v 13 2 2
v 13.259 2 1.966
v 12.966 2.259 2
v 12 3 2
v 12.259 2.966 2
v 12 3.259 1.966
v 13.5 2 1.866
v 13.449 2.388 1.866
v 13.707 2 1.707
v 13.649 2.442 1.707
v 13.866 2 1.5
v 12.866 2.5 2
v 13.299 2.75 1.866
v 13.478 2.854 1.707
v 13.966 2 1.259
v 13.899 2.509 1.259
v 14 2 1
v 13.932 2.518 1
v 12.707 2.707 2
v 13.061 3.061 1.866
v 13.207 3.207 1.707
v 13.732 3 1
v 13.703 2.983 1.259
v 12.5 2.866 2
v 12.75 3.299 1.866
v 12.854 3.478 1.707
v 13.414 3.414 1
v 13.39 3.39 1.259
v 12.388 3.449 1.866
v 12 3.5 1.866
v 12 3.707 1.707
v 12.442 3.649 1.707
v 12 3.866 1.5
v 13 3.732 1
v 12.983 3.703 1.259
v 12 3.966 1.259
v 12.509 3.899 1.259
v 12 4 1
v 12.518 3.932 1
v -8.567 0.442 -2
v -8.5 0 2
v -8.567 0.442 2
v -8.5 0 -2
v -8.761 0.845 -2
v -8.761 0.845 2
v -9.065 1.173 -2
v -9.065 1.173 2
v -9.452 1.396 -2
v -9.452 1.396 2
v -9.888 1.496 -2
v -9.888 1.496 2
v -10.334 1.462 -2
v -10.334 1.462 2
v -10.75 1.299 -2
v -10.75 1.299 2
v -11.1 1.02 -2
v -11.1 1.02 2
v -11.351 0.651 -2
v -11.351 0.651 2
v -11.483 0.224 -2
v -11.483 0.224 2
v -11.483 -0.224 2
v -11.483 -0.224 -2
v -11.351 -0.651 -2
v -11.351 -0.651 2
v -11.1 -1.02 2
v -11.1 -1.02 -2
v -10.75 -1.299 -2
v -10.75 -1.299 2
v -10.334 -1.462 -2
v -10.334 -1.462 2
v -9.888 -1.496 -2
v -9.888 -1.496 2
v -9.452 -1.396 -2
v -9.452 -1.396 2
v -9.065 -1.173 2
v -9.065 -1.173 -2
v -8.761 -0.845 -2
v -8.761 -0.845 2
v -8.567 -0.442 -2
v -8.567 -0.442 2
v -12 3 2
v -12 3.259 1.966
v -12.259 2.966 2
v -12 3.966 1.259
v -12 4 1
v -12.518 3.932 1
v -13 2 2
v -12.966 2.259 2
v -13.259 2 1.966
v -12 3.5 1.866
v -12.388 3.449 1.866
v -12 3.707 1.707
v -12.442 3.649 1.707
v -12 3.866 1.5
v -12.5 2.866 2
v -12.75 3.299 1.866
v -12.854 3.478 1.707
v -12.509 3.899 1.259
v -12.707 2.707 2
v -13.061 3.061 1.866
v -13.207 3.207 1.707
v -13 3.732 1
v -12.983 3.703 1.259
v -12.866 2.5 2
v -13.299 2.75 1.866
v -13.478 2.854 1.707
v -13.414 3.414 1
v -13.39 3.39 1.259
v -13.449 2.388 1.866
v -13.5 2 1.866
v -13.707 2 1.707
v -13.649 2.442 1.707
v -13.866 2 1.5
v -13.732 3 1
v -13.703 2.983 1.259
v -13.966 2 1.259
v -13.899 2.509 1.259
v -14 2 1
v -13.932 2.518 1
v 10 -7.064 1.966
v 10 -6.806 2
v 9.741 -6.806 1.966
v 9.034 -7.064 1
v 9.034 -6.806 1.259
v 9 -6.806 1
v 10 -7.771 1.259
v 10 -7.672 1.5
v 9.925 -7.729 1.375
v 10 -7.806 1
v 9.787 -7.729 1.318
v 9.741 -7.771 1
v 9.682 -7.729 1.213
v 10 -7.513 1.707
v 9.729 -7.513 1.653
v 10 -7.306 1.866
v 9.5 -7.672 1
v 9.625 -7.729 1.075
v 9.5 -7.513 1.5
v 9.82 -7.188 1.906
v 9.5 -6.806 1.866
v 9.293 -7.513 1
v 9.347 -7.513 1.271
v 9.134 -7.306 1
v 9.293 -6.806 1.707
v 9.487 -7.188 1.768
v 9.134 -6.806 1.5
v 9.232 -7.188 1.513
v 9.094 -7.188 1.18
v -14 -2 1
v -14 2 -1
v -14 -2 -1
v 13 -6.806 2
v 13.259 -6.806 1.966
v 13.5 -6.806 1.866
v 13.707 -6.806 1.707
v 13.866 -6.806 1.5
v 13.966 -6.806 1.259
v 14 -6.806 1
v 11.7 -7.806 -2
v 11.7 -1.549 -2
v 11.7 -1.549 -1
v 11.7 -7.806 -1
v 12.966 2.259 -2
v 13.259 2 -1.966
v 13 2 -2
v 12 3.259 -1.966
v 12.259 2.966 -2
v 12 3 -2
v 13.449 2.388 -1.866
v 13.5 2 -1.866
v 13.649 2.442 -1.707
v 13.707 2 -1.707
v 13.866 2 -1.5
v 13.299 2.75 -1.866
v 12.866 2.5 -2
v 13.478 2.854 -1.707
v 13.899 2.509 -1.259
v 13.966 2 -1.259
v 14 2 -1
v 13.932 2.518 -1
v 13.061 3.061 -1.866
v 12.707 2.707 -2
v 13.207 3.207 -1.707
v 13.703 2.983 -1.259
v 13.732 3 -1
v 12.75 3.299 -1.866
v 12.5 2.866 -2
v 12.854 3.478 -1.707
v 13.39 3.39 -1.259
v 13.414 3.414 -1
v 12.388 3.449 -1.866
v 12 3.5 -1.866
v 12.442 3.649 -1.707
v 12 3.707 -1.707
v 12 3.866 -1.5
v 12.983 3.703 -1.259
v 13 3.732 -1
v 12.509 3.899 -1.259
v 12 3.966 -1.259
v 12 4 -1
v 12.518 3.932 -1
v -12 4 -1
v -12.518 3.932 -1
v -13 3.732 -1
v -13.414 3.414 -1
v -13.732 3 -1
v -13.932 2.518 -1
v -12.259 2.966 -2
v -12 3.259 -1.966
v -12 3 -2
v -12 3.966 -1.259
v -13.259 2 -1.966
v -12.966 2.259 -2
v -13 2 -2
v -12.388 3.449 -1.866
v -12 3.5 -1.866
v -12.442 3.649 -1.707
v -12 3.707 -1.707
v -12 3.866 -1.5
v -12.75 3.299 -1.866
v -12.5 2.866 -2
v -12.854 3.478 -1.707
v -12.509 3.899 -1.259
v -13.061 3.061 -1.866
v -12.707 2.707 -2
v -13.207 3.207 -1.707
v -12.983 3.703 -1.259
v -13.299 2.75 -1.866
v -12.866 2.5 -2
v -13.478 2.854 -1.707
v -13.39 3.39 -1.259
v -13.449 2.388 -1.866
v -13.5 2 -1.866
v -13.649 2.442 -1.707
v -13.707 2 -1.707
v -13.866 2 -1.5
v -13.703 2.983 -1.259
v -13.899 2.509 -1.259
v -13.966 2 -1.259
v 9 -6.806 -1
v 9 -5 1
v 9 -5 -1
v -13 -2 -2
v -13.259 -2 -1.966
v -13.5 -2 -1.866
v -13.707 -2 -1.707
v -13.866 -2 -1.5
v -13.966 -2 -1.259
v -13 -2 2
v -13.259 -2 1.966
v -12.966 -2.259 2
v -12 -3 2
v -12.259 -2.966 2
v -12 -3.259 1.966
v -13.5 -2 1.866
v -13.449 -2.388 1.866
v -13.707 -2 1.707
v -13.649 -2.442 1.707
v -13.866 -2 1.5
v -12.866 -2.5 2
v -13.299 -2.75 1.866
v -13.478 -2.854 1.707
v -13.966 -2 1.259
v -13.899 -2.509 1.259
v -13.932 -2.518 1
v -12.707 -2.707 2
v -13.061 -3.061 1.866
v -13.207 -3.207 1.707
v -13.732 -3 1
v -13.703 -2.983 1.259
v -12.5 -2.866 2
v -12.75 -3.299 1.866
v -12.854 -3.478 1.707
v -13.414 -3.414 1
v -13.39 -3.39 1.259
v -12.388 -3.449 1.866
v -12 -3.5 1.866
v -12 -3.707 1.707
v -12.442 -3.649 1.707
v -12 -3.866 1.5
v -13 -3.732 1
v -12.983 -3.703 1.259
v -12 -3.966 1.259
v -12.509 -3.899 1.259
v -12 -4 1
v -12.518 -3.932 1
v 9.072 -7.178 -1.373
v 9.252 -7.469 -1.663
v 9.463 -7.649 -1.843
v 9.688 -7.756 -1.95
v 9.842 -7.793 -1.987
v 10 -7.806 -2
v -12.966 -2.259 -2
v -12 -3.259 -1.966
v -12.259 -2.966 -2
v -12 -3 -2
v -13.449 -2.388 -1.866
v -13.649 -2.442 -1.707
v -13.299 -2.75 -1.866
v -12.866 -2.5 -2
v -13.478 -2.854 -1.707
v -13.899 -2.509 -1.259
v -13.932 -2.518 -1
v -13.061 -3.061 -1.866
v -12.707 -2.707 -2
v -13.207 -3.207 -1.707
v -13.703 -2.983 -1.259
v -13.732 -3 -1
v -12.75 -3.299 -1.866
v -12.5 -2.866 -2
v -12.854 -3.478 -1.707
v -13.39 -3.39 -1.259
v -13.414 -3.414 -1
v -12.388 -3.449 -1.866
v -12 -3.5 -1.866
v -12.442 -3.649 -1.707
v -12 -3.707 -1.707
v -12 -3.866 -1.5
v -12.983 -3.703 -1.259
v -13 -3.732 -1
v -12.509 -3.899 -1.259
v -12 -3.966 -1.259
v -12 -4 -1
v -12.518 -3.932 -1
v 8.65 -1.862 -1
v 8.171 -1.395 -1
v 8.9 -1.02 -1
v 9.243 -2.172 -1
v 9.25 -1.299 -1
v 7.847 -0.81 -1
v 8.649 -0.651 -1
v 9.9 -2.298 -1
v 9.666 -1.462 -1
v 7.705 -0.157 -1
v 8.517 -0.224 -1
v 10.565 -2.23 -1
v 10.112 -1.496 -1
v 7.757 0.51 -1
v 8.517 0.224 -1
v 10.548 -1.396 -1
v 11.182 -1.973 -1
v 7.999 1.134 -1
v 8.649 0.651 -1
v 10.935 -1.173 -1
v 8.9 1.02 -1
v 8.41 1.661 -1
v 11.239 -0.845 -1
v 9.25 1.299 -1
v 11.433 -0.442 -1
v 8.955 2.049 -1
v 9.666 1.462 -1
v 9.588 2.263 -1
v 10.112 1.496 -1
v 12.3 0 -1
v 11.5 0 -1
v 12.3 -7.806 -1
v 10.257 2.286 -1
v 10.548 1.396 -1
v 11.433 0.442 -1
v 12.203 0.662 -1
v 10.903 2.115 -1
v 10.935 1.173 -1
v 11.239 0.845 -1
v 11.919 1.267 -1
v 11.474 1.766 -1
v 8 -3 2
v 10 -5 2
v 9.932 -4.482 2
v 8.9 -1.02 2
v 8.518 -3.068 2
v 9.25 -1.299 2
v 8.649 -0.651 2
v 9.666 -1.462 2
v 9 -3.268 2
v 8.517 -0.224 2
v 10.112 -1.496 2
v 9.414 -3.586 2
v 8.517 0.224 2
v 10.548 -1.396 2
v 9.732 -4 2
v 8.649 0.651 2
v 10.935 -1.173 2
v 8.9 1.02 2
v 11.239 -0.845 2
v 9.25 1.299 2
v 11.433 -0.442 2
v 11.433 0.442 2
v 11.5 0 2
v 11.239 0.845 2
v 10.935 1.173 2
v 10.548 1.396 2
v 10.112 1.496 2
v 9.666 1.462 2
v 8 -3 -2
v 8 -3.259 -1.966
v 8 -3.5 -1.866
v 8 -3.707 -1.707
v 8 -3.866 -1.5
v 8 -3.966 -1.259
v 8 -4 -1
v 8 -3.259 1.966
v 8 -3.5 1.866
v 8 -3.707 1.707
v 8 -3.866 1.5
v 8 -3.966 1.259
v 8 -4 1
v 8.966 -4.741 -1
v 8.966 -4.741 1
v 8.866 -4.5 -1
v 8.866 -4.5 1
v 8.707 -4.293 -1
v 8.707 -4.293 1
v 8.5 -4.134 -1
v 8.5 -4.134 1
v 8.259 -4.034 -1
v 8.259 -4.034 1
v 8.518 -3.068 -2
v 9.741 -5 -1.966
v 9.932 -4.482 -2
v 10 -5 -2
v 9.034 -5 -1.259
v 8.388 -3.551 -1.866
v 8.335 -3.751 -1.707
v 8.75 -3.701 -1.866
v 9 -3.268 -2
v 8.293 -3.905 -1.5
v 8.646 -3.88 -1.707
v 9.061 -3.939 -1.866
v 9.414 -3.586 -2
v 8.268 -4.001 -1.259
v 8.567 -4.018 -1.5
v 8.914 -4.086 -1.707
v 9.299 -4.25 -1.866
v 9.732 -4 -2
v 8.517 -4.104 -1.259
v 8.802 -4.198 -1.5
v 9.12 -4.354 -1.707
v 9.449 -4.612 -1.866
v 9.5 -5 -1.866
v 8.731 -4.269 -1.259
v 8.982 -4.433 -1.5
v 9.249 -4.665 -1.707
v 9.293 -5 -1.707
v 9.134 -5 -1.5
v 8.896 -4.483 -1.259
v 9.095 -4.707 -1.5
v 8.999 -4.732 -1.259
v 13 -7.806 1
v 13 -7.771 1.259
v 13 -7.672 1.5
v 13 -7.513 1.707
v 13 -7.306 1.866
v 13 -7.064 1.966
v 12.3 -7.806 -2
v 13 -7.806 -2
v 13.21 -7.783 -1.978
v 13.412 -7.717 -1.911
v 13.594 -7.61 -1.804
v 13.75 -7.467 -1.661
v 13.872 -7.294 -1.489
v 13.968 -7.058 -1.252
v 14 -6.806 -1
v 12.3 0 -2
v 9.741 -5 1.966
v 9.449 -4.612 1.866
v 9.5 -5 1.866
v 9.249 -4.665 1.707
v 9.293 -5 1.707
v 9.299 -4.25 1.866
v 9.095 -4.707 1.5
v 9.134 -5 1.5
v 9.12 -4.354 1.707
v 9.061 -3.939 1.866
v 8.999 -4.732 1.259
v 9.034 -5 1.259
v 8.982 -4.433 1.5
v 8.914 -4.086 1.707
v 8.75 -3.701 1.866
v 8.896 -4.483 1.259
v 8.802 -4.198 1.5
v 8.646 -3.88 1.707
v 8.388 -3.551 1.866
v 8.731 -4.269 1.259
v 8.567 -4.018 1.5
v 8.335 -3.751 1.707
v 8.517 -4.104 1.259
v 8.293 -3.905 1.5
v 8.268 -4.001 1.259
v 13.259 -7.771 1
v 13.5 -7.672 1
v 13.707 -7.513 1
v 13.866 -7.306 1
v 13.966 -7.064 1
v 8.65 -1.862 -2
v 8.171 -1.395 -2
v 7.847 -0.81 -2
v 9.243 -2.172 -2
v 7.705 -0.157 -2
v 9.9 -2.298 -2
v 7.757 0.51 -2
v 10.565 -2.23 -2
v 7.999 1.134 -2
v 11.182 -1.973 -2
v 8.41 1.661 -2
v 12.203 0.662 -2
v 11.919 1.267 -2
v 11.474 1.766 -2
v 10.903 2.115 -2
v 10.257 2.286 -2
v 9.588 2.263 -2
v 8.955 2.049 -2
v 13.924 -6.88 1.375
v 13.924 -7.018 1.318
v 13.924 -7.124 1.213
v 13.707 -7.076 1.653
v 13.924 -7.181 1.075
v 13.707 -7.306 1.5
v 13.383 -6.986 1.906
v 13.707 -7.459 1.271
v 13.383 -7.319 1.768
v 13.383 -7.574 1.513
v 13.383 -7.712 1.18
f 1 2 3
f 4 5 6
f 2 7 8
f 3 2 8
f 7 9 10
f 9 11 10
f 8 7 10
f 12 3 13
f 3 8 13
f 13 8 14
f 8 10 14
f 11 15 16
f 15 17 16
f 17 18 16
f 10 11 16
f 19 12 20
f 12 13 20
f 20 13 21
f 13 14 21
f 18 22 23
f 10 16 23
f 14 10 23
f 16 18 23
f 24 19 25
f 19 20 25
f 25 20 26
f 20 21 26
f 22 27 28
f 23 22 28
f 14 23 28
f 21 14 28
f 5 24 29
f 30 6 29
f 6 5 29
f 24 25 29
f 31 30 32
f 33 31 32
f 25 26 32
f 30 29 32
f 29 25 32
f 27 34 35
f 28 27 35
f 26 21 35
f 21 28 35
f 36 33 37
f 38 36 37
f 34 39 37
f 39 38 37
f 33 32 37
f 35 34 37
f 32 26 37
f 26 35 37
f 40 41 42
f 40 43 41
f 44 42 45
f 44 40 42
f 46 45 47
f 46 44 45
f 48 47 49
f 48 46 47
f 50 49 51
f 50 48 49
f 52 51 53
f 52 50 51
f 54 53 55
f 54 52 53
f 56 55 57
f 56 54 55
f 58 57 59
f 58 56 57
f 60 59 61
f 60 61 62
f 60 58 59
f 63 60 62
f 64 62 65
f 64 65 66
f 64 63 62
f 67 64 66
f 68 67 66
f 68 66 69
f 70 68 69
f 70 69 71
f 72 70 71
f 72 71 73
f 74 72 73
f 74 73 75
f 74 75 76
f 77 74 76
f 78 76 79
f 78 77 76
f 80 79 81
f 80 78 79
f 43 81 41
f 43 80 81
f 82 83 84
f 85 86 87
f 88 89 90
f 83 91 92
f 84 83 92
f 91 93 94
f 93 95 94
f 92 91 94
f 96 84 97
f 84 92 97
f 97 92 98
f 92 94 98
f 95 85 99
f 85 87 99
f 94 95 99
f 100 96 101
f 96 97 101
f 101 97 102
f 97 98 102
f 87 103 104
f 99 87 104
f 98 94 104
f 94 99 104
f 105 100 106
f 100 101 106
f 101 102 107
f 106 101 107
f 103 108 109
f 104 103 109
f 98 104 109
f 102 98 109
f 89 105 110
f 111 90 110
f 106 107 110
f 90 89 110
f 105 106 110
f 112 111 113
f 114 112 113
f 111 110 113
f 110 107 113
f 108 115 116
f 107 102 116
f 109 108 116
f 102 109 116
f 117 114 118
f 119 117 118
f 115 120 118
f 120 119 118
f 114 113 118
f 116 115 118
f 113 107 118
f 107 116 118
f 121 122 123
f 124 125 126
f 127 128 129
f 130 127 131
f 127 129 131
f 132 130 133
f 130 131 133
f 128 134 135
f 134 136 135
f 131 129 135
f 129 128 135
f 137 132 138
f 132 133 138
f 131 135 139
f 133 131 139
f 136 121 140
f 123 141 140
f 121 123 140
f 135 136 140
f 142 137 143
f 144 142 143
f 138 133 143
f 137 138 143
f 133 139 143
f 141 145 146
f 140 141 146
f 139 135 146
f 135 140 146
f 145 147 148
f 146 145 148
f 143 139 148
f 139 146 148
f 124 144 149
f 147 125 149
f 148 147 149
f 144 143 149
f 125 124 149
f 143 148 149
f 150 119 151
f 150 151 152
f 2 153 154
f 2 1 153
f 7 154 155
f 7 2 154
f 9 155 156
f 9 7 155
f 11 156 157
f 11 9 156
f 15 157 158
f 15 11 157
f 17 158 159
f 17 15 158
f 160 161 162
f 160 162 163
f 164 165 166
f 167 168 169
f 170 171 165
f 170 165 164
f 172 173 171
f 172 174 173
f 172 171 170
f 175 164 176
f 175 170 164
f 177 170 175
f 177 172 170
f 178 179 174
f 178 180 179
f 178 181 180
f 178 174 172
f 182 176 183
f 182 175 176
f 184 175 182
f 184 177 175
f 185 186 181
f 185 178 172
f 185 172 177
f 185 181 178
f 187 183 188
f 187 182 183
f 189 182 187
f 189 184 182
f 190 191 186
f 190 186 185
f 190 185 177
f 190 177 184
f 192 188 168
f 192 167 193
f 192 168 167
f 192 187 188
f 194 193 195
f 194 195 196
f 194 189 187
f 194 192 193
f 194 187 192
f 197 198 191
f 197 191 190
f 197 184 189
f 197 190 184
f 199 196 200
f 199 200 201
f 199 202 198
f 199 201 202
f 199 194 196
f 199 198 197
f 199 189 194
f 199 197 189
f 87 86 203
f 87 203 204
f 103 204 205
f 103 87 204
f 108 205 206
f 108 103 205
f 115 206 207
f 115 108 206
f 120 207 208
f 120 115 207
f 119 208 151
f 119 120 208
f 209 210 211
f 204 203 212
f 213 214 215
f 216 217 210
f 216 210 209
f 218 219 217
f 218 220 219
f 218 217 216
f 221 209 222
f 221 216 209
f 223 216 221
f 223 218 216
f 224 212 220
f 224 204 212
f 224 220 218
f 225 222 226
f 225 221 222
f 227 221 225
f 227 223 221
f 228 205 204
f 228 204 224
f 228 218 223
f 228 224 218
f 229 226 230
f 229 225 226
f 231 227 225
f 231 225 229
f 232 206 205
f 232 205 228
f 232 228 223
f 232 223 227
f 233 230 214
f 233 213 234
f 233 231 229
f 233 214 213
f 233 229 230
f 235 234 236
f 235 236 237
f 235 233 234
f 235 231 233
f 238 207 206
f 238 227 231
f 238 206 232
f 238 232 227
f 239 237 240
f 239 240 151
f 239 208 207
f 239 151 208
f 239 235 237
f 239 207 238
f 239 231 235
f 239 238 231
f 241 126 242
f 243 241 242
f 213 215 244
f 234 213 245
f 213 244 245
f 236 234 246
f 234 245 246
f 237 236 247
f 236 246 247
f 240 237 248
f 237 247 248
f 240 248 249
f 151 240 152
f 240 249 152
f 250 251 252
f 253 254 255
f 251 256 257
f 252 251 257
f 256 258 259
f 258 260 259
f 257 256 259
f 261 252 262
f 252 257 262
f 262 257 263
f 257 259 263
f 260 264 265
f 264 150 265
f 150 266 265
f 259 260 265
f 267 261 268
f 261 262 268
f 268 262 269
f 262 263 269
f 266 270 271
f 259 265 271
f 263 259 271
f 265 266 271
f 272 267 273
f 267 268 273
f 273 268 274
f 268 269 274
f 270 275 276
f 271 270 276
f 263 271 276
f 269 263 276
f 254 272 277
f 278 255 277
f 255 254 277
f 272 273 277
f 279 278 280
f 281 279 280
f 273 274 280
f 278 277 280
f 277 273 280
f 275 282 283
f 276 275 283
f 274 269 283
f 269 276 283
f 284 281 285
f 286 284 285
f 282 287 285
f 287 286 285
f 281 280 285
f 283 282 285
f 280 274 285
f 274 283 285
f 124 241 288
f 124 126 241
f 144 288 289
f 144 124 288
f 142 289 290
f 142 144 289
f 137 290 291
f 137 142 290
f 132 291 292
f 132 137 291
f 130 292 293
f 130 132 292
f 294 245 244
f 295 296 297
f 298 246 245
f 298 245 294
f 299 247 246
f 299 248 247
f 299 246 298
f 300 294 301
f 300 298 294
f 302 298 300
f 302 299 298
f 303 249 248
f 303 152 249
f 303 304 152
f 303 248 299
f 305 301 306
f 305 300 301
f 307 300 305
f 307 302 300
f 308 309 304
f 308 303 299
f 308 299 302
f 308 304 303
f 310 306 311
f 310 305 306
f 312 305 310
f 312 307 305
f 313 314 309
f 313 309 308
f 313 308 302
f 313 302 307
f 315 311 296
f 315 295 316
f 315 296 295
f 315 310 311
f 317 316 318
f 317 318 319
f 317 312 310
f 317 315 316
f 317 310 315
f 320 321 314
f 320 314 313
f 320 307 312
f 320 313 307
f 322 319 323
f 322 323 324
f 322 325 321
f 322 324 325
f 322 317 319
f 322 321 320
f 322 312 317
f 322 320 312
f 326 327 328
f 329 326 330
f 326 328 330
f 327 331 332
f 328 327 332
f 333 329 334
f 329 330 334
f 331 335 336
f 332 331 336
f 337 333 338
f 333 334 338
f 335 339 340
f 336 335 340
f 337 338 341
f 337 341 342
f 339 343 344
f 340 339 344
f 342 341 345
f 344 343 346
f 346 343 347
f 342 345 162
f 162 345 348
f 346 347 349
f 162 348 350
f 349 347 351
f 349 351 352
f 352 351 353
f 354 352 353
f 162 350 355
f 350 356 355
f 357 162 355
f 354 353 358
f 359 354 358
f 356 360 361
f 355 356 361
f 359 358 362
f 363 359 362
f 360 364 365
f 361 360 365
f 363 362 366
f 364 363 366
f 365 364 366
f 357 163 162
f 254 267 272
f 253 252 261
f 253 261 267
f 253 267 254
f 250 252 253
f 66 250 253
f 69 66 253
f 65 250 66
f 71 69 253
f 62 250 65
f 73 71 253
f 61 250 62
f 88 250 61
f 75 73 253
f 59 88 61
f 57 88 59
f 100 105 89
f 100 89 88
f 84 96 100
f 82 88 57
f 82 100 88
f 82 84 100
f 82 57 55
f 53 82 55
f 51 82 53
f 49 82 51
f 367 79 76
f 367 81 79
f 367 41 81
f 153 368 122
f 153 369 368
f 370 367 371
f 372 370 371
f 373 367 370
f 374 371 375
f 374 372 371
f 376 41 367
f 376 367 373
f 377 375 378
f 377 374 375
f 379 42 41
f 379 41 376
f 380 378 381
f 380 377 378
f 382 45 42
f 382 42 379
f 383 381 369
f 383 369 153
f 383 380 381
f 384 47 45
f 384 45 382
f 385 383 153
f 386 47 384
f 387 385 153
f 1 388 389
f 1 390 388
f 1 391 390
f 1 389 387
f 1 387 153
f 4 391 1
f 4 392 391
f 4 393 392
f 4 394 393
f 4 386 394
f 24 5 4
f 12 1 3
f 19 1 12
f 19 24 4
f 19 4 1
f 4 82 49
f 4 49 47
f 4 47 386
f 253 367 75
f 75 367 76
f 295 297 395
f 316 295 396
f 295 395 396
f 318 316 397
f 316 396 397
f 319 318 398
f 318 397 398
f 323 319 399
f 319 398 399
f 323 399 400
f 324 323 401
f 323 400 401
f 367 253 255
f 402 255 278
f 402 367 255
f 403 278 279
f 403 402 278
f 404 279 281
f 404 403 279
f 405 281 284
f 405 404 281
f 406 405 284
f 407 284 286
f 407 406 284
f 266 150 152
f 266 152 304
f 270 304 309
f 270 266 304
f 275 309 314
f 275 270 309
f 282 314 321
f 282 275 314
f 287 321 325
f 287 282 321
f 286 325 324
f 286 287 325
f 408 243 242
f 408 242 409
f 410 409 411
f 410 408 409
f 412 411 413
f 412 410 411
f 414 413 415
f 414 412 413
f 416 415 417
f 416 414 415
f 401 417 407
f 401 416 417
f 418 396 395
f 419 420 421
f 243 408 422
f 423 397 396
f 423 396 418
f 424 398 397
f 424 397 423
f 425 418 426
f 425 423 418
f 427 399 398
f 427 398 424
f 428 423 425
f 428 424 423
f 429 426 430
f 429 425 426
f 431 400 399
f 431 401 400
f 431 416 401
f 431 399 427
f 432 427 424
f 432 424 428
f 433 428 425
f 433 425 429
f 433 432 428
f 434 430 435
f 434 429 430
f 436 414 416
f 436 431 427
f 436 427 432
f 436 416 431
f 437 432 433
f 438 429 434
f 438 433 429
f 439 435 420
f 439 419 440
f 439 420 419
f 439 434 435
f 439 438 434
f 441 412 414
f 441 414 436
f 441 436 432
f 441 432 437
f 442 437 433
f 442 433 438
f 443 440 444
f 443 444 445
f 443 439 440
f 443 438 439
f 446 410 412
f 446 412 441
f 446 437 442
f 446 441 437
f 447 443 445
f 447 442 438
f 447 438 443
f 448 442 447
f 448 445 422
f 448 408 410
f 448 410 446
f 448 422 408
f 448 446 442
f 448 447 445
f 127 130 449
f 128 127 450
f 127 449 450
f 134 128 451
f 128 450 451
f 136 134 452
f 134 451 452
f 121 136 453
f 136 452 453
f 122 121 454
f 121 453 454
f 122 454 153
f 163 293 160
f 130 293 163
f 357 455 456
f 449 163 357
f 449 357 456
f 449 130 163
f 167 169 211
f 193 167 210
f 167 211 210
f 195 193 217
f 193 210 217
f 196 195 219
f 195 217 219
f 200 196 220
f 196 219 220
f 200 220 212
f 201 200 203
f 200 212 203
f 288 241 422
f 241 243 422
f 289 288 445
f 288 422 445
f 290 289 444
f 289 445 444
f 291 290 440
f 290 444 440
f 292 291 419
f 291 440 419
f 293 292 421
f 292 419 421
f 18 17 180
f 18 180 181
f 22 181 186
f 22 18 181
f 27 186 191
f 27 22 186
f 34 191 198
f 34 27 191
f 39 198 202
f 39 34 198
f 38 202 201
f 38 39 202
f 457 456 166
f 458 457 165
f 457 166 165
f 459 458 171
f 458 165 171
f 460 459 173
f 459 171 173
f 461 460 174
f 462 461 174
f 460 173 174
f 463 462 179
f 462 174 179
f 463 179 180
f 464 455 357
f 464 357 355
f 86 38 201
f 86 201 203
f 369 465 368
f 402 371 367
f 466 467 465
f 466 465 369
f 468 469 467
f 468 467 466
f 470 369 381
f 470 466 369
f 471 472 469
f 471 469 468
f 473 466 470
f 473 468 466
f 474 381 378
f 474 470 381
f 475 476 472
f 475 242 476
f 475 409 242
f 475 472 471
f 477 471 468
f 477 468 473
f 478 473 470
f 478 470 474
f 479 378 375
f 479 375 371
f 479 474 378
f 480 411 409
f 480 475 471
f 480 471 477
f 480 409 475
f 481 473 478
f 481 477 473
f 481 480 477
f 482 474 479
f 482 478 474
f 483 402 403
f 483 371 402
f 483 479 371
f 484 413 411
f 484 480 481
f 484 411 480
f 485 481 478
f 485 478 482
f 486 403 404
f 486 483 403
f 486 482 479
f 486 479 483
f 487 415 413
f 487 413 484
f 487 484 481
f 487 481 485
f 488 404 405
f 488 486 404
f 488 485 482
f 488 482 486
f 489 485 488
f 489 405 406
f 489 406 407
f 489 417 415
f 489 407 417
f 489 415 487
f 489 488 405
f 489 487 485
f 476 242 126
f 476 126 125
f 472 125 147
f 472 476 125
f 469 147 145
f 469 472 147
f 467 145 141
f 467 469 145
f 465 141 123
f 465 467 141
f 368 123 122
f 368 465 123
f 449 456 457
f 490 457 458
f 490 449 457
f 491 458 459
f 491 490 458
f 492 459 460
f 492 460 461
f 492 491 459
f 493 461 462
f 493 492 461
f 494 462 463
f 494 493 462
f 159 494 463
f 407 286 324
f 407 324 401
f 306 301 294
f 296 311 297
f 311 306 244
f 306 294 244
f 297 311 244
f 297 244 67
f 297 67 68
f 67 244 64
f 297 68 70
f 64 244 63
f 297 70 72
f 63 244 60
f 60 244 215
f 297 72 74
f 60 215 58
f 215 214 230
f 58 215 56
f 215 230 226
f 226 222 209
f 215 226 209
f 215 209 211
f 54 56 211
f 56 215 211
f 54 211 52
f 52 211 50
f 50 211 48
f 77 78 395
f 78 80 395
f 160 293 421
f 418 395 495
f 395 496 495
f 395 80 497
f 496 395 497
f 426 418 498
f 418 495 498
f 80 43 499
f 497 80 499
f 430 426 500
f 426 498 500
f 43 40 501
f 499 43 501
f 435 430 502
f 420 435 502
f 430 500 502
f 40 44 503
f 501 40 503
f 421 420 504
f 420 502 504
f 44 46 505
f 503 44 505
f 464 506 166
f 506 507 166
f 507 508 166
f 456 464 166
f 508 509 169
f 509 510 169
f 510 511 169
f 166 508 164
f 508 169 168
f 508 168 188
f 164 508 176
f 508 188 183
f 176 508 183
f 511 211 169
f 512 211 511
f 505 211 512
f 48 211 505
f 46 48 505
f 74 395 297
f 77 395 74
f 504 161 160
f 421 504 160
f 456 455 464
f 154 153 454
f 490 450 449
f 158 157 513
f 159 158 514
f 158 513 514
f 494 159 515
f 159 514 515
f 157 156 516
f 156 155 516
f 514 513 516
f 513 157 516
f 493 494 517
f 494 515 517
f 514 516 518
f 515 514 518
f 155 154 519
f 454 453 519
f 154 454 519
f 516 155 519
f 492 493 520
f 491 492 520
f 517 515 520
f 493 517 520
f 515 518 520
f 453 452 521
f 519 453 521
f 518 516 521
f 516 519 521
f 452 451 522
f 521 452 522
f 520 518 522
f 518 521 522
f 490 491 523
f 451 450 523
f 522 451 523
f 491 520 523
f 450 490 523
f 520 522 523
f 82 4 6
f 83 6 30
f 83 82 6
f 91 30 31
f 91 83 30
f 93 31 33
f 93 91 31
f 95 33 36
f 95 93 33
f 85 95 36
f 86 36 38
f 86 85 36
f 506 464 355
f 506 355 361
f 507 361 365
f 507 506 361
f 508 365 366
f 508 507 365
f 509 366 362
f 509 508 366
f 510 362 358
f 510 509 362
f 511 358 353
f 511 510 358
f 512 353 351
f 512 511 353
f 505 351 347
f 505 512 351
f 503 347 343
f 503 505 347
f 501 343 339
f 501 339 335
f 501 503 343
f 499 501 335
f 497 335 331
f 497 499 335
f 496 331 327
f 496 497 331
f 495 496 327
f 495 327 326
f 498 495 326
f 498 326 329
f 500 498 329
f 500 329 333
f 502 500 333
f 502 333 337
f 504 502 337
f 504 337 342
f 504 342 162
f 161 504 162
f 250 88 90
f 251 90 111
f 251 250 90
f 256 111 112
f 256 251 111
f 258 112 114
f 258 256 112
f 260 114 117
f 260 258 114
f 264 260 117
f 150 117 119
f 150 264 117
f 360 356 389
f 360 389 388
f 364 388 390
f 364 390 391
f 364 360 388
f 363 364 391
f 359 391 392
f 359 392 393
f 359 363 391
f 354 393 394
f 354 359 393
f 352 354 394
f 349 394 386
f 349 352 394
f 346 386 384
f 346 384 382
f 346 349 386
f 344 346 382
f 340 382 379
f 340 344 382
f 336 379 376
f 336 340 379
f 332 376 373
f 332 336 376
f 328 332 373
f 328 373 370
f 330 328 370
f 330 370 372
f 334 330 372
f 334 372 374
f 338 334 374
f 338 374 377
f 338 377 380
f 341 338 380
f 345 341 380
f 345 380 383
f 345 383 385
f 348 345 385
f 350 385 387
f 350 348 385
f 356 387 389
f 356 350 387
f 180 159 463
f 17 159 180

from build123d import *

# Parameters (mm, degrees)
SKETCH1_W      = 2.7
SKETCH1_H      = 3.805531959
SKETCH1_W_2    = 1.7
SKETCH1_R      = 1.5
SKETCH1_R_2    = 2.3
EXTRUDE1_DEPTH = 2
EXTRUDE2_START = -2
SKETCH1_4_R    = 2.3
SKETCH1_4_R_2  = 1.5
EXTRUDE2_DEPTH = 1
FILLET1_R      = 1


with BuildPart() as part:
    # Sketch1 → Extrude1 (new, symmetric)
    with BuildSketch(Plane.XY):
        with BuildLine():
            Line((12.3, -4), (12.3, -3.977371993))
            ThreePointArc((12.3, -3.977371993), (12.150426084, -3.994334975), (12, -4))
            Line((12, -4), (12.3, -4))
        make_face()
        with BuildLine():
            Line((14, -4), (14, -2))
            ThreePointArc((14, -2), (13.516575089, -3.303840481), (12.3, -3.977371993))
            Line((12.3, -3.977371993), (12.3, -4))
            Line((12.3, -4), (14, -4))
        make_face()
        with Locations((10.35, -5.902765979)):
            Rectangle(SKETCH1_W, SKETCH1_H)
        Polygon((12, -4), (11.7, -4), (11.7, -7.805531959), (12.3, -7.805531959), (12.3, -4), align=None)
        with Locations((13.15, -5.902765979)):
            Rectangle(SKETCH1_W_2, SKETCH1_H)
        with BuildLine():
            ThreePointArc((12, -4), (12.150426084, -3.994334975), (12.3, -3.977371993))
            Line((12.3, -3.977371993), (12.3, 0))
            ThreePointArc((12.3, 0), (12.144761059, -0.830662386), (11.7, -1.549193338))
            Line((11.7, -1.549193338), (11.7, -4))
            Line((11.7, -4), (12, -4))
        make_face()
        with BuildLine():
            Line((12, 4), (-12, 4))
            ThreePointArc((-12, 4), (-13.414213562, 3.414213562), (-14, 2))
            Line((-14, 2), (-14, -2))
            ThreePointArc((-14, -2), (-13.414213562, -3.414213562), (-12, -4))
            Line((-12, -4), (9, -4))
            Line((9, -4), (11.7, -4))
            Line((11.7, -4), (11.7, -1.549193338))
            ThreePointArc((11.7, -1.549193338), (7.855238941, 0.830662386), (12.3, 0))
            Line((12.3, 0), (12.3, -3.977371993))
            ThreePointArc((12.3, -3.977371993), (13.516575089, -3.303840481), (14, -2))
            Line((14, -2), (14, 2))
            ThreePointArc((14, 2), (13.414213562, 3.414213562), (12, 4))
        make_face()
        with Locations((-10, 0)):
            Circle(SKETCH1_R, mode=Mode.SUBTRACT)
        with Locations((10, 0)):
            Circle(SKETCH1_R_2)
        with Locations((10, 0)):
            Circle(SKETCH1_R, mode=Mode.SUBTRACT)
    extrude(amount=EXTRUDE1_DEPTH, both=True)

    # Sketch1_4 → Extrude2 (cut)
    with BuildSketch(Plane.XY.offset(EXTRUDE2_START)):
        with BuildLine():
            Line((12.3, -4), (12.3, -3.977371993))
            ThreePointArc((12.3, -3.977371993), (12.150426084, -3.994334975), (12, -4))
            Line((12, -4), (12.3, -4))
        make_face()
        with Locations((10, 0)):
            Circle(SKETCH1_4_R)
        with Locations((10, 0)):
            Circle(SKETCH1_4_R_2, mode=Mode.SUBTRACT)
        with BuildLine():
            ThreePointArc((12, -4), (12.150426084, -3.994334975), (12.3, -3.977371993))
            Line((12.3, -3.977371993), (12.3, 0))
            ThreePointArc((12.3, 0), (12.144761059, -0.830662386), (11.7, -1.549193338))
            Line((11.7, -1.549193338), (11.7, -4))
            Line((11.7, -4), (12, -4))
        make_face()
        Polygon((12, -4), (11.7, -4), (11.7, -7.805531959), (12.3, -7.805531959), (12.3, -4), align=None)
    extrude(amount=EXTRUDE2_DEPTH, mode=Mode.SUBTRACT)

    # Fillet1
    fillet1_edges = [part.edges().sort_by_distance(p)[0] for p in [
        (9, -5.902765979, 2),
        (-13.414213562, -3.414213562, -2),
        (-14, 0, -2),
        (11.5, -7.805531959, 2),
        (-13.414213562, 3.414213562, -2),
        (0, 4, -2),
        (13.414213562, 3.414213562, -2),
        (14, -2.902765979, -2),
        (9, -5.902765979, -2),
        (-1.5, -4, -2),
        (14, -2.902765979, 2),
        (14, -7.805531959, 0),
        (9, -7.805531959, 0),
        (9, -4, 0),
        (13.414213562, 3.414213562, 2),
        (0, 4, 2),
        (-13.414213562, 3.414213562, 2),
        (-14, 0, 2),
        (-13.414213562, -3.414213562, 2),
        (-1.5, -4, 2),
    ]]
    fillet(fillet1_edges, radius=FILLET1_R)


solid = part.part
